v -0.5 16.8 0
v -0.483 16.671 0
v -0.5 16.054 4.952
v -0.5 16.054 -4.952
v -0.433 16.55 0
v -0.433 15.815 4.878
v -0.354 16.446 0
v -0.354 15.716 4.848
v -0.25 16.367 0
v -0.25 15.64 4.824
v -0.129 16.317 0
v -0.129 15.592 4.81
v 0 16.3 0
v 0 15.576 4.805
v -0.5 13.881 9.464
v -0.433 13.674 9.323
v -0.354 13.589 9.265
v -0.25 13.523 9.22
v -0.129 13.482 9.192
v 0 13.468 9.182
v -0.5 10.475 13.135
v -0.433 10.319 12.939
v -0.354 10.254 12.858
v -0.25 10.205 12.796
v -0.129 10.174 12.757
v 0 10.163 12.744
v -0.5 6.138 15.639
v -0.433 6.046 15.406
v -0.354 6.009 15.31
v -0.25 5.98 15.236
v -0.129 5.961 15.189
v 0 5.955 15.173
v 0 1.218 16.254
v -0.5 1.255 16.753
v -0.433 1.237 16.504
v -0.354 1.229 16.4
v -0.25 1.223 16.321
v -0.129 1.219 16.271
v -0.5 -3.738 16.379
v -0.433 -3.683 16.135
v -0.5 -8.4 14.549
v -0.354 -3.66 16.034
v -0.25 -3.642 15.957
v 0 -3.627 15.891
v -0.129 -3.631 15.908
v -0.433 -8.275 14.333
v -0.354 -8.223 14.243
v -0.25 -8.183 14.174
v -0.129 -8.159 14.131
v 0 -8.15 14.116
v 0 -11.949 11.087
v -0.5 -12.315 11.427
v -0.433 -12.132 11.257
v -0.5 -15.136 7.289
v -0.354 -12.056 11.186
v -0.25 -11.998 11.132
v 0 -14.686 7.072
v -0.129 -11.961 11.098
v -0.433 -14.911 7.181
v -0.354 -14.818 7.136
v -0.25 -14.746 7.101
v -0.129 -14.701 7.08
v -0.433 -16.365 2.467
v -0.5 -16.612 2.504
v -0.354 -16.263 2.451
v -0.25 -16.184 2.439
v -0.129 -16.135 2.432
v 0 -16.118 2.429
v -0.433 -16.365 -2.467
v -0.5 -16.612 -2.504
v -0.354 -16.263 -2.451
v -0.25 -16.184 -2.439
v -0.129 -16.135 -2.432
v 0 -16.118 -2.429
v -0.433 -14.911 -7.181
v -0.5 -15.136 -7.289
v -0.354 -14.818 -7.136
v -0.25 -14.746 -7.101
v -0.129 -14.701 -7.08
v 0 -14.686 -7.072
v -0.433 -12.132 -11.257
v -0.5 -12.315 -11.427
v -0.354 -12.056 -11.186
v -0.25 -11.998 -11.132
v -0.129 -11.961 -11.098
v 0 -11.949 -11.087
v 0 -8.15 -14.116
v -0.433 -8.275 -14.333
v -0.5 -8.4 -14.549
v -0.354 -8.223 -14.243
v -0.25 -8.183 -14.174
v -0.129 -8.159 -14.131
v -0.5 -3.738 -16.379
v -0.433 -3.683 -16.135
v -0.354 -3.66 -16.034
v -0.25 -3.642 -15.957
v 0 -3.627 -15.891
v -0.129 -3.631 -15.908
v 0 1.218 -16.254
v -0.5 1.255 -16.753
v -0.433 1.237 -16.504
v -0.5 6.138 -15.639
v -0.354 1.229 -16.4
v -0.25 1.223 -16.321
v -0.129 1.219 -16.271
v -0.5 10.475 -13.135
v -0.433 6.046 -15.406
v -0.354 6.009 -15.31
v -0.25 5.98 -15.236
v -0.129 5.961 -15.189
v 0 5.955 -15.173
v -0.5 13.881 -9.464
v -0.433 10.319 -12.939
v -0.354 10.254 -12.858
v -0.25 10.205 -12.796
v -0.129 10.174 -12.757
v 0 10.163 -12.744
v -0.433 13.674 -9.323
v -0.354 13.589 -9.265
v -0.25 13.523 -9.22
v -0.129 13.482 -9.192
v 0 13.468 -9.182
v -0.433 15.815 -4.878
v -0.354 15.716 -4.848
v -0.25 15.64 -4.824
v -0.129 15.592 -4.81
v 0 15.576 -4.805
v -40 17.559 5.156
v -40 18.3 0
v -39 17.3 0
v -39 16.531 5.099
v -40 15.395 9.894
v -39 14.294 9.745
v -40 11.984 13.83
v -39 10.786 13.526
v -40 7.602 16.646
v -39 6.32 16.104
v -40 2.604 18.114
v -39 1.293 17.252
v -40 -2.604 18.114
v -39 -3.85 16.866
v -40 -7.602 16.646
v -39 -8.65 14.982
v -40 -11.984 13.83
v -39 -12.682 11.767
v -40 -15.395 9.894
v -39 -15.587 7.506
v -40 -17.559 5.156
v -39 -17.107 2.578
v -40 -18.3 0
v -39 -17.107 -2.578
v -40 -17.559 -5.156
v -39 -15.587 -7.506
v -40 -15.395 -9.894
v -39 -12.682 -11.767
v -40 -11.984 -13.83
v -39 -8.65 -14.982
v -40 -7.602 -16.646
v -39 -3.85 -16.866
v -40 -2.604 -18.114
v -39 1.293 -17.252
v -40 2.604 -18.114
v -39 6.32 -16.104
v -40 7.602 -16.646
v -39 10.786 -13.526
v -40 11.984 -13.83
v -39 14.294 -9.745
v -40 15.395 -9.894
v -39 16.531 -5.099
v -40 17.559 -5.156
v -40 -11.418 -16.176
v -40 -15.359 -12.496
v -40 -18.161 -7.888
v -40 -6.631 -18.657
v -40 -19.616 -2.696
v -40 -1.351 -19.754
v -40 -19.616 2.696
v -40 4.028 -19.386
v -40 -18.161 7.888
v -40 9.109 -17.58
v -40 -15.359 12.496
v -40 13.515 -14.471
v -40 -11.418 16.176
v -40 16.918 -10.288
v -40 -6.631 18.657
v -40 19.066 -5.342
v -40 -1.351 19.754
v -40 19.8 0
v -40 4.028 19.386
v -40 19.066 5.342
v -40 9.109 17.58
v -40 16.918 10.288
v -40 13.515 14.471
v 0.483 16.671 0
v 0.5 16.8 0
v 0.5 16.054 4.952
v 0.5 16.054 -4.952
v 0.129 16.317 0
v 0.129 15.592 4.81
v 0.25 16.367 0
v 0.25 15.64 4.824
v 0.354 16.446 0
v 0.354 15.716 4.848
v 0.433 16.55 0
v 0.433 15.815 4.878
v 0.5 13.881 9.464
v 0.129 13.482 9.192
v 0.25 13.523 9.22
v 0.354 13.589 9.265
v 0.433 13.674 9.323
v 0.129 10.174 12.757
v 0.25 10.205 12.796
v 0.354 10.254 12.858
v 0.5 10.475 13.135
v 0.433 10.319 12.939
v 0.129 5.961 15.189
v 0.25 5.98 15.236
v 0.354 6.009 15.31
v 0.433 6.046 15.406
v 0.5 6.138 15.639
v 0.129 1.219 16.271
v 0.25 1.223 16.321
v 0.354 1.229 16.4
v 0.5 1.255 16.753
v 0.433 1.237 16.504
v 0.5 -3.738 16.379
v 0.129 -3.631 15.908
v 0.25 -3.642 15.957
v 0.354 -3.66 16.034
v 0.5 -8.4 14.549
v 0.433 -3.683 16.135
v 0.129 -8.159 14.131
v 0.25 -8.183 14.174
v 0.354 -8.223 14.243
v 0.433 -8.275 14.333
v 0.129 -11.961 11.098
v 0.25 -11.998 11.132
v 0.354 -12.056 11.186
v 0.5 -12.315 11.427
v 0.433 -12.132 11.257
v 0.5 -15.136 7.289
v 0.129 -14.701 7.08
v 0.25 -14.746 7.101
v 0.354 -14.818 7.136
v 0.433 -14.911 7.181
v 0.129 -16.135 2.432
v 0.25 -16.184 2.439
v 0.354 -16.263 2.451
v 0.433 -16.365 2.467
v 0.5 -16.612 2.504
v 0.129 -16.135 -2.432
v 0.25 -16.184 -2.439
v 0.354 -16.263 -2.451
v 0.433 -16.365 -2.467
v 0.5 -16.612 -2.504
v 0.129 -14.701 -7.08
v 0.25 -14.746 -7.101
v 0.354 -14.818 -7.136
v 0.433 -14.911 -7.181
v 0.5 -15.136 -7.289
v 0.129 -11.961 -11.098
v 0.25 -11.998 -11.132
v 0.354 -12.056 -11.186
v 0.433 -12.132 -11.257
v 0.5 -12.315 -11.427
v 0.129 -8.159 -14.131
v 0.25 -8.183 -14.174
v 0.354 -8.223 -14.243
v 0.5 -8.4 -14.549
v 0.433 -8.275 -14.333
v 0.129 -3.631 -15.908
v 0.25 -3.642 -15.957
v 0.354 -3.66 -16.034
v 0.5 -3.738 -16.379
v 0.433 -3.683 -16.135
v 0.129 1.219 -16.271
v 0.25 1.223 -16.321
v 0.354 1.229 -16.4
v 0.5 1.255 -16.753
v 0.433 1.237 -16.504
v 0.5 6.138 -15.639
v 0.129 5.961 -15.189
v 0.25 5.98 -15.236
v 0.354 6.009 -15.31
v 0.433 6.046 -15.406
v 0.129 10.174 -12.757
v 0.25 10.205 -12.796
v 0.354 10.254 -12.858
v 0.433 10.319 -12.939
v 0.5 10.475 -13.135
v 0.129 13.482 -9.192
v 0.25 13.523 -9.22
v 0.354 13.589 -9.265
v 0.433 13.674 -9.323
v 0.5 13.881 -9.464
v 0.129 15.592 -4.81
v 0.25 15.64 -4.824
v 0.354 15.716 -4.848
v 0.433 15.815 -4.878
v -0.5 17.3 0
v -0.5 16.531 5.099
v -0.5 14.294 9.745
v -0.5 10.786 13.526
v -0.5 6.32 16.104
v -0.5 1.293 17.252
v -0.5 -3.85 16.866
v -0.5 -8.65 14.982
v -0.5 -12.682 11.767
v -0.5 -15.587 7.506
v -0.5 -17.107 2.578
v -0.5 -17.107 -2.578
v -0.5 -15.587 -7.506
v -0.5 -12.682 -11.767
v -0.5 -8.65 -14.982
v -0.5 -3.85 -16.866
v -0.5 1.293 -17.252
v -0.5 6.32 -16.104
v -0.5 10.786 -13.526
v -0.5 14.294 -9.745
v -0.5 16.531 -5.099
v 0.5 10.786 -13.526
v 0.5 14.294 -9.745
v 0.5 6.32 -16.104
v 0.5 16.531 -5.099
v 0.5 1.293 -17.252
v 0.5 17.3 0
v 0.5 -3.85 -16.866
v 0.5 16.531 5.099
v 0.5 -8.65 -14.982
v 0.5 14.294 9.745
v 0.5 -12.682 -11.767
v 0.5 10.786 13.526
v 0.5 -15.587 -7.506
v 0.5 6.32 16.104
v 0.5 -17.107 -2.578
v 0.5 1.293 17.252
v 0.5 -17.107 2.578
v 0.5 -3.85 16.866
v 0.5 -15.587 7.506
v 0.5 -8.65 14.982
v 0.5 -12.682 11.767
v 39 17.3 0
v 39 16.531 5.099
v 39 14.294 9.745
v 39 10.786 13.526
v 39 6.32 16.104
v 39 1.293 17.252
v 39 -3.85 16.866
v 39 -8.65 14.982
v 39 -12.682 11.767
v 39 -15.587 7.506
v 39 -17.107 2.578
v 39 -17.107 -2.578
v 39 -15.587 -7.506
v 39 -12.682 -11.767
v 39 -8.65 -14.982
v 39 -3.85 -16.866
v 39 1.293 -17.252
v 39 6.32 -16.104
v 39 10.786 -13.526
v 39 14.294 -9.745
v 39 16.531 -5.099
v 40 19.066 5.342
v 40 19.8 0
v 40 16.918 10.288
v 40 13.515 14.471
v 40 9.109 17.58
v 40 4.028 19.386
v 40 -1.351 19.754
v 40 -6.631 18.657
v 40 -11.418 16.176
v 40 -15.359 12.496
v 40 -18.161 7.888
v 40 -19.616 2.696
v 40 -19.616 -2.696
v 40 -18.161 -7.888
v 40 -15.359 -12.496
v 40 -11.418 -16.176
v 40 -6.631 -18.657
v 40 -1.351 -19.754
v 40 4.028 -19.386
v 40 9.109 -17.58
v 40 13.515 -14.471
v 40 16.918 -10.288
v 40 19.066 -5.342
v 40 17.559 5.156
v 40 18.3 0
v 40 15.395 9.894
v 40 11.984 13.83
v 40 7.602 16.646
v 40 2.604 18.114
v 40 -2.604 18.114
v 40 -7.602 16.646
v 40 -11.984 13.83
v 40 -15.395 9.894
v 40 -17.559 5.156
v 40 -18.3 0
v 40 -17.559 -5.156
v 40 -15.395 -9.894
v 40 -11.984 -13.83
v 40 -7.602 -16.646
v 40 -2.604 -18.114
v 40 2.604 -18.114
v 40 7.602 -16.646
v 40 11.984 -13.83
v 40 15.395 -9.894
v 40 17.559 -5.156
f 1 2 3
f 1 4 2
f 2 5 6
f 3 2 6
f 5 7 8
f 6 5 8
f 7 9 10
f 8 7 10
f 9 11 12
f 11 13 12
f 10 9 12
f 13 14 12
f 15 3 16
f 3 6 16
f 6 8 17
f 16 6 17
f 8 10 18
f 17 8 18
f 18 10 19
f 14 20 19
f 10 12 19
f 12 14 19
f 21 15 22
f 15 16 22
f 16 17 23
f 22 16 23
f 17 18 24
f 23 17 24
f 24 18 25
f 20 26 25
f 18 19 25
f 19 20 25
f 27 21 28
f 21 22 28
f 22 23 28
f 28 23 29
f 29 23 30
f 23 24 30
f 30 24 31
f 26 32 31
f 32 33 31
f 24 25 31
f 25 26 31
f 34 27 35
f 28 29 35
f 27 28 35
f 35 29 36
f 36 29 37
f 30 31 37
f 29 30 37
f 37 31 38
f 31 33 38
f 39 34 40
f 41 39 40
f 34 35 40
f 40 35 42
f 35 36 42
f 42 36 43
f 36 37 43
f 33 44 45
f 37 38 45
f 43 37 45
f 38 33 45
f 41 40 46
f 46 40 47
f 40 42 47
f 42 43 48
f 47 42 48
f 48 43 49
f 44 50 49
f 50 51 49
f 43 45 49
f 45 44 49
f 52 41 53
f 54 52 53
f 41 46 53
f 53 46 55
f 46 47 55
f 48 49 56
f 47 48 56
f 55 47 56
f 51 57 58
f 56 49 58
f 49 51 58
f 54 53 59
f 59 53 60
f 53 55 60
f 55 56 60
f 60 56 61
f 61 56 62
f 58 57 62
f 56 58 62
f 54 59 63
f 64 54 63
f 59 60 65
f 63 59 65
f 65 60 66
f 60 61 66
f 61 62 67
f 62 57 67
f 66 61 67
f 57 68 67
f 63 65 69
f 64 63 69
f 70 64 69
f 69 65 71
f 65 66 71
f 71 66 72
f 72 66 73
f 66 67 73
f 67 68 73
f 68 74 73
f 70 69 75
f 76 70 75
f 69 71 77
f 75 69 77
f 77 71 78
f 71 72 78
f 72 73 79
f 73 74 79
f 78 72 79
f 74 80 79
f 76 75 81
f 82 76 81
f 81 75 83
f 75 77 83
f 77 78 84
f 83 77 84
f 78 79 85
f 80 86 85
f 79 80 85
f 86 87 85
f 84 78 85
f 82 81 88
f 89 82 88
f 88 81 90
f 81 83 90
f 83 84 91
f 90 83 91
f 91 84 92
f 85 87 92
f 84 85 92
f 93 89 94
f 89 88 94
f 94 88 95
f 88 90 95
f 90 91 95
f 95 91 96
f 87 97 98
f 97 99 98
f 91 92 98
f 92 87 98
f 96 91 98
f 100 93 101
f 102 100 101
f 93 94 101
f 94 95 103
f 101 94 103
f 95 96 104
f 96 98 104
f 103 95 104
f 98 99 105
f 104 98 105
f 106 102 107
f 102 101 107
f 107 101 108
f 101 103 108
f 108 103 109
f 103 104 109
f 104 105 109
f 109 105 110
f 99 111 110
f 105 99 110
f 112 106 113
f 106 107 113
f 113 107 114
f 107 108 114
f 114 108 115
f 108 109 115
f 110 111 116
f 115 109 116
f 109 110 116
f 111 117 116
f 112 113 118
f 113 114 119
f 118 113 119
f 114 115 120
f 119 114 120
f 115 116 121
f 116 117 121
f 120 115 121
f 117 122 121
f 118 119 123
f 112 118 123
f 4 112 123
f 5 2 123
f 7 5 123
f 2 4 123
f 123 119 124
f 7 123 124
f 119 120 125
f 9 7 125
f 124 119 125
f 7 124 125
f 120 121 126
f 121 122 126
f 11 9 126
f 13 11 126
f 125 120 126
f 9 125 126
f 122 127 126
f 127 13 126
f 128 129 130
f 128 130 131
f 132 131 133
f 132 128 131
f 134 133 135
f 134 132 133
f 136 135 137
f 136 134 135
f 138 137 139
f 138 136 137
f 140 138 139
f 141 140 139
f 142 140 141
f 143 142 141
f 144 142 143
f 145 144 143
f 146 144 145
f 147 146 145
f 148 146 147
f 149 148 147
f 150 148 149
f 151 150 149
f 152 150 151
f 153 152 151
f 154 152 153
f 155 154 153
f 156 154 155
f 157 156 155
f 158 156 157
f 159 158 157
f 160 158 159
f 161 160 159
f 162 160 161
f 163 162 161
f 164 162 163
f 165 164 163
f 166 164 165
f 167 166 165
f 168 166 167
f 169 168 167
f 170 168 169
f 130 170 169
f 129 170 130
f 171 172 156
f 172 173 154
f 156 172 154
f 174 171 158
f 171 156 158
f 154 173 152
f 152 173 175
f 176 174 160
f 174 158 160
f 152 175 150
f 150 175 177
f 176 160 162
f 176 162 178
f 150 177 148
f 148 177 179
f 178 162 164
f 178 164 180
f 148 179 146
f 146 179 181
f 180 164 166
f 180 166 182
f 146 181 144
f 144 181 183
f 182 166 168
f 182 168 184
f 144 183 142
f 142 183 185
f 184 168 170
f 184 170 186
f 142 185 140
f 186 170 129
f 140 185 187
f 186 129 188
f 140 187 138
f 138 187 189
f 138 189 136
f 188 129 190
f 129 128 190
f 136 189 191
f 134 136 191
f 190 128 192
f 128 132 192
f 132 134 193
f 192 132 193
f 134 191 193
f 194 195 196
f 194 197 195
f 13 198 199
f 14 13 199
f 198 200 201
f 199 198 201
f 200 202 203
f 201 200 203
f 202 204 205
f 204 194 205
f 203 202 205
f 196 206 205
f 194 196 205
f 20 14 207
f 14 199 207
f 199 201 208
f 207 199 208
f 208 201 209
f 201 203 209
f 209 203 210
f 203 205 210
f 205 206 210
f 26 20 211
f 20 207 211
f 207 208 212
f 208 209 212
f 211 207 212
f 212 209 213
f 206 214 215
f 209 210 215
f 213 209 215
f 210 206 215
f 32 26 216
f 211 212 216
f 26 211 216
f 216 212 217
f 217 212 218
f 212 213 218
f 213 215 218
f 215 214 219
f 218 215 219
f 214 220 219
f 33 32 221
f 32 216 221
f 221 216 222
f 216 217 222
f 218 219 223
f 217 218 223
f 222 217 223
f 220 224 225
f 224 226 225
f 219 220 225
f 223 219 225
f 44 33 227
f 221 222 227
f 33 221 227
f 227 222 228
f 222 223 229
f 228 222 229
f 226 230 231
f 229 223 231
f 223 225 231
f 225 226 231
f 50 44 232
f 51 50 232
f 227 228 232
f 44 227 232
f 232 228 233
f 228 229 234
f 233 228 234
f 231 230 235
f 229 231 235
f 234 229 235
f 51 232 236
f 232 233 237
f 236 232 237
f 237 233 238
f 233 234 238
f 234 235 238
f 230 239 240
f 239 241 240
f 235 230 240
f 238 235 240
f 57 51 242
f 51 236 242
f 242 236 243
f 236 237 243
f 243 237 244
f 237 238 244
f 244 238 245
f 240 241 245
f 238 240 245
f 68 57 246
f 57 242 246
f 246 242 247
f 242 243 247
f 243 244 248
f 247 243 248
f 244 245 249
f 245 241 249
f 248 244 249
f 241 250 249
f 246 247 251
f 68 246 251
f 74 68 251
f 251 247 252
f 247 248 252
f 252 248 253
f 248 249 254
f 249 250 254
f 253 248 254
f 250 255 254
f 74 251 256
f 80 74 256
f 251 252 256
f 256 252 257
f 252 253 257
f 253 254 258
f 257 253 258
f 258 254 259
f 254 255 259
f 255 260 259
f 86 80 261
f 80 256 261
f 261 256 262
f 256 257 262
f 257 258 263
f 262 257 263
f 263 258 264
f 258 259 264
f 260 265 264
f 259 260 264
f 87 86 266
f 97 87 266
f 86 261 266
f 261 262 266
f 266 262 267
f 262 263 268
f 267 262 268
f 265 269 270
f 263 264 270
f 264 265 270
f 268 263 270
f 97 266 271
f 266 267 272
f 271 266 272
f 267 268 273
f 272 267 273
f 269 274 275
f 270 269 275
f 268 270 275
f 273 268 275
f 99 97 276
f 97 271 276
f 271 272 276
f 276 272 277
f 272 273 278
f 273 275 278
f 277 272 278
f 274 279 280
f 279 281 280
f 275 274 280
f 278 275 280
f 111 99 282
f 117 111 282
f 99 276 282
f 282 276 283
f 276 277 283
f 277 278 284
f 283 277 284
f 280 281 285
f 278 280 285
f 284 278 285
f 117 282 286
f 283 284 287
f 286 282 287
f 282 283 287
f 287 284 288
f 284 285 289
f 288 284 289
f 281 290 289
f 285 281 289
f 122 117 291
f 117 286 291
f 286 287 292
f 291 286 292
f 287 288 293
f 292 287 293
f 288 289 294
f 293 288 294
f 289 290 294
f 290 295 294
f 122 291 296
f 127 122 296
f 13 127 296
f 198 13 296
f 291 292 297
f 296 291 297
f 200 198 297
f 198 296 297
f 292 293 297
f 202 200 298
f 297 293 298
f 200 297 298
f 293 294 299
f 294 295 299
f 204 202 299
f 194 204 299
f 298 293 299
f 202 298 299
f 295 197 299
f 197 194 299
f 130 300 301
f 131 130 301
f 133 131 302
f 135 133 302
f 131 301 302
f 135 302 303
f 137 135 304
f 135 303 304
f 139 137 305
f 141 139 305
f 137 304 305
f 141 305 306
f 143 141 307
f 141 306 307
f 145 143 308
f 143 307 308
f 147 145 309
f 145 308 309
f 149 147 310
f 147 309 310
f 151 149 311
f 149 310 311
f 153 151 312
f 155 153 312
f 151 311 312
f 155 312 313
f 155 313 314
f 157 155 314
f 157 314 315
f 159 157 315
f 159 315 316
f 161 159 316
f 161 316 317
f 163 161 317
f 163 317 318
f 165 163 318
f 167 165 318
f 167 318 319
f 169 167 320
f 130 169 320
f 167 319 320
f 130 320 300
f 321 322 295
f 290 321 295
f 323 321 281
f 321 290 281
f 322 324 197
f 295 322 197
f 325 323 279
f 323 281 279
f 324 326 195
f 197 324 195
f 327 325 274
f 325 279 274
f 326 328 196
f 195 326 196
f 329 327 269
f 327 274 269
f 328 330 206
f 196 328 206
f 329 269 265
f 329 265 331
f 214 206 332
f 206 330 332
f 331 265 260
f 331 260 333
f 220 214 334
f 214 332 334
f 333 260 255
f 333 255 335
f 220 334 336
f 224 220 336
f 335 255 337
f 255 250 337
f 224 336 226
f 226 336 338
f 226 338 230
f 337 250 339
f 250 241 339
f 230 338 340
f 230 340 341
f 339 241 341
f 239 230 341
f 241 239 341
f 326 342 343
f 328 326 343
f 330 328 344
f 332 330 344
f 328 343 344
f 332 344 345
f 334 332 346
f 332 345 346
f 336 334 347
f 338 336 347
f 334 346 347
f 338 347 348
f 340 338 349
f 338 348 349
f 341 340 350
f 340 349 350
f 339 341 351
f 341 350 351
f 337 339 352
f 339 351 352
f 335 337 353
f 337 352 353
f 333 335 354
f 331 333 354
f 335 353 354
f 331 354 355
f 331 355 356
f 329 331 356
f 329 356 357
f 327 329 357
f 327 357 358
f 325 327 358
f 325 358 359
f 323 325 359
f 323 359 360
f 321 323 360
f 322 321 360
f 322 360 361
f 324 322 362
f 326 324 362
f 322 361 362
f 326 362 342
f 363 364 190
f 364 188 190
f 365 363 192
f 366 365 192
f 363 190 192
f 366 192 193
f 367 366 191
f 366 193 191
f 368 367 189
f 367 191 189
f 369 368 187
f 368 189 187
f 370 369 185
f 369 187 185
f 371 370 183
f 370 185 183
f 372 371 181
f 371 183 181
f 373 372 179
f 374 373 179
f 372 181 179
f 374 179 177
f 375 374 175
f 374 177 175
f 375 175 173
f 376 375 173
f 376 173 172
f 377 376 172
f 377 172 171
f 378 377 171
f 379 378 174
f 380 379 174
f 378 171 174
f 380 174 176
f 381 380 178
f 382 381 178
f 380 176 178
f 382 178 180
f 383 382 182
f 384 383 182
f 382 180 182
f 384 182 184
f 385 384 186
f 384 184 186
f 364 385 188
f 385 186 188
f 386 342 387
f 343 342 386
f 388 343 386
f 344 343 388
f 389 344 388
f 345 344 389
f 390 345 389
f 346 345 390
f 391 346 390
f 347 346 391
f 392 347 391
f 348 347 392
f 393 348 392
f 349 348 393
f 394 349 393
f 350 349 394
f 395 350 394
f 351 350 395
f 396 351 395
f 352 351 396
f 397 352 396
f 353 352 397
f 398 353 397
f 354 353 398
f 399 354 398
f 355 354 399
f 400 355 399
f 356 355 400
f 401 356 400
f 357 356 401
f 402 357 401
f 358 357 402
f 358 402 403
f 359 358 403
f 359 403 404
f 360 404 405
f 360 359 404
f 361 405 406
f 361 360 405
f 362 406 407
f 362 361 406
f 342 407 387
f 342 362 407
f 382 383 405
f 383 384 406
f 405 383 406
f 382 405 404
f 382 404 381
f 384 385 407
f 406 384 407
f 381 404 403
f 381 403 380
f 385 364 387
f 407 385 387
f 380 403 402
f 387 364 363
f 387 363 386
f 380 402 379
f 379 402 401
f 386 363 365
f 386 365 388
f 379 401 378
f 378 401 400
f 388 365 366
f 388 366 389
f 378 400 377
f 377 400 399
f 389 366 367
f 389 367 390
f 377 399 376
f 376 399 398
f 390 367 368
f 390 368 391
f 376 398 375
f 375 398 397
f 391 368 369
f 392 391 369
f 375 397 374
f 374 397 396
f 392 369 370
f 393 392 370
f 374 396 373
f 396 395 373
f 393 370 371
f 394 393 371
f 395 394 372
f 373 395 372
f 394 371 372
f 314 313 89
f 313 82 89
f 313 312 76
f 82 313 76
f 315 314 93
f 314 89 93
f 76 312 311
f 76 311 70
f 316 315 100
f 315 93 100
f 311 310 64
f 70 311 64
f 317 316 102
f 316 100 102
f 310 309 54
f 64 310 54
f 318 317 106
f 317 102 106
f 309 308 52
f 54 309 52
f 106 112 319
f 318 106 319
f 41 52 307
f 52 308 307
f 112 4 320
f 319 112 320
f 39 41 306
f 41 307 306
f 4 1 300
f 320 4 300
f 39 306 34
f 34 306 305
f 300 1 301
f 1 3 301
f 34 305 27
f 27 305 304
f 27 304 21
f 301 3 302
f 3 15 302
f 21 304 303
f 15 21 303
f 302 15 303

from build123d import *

# Parameters (mm, degrees)
F2_R    = 0.49999
F3_SIZE = 1


# Not quite as in the source:
# - a fillet or chamfer is up to 0.001 mm smaller than in the source, because OpenCascade refuses the exact size


with BuildPart() as f1:
    # F0 (on Top) → F1 (revolve)
    with BuildSketch(Plane.XY):
        Polygon((0, 19.8), (-40, 19.8), (-40, 17.3), (-0.5, 17.3), (-0.5, 16.3), (0, 16.3), (0.5, 16.3), (0.5, 17.3), (40, 17.3), (40, 19.8), align=None)
    revolve(axis=Axis((0, 0, 0), (1, 0, 0)))

    # F2 (radius 0.5 in the source; OpenCascade refuses exactly that, so slightly less here)
    f2_edges = [f1.edges().sort_by_distance(p)[0] for p in [
        (-0.5, -16.3, 0),
        (0.5, -16.3, 0),
    ]]
    fillet(f2_edges, radius=F2_R)

    # F3
    f3_edges = [f1.edges().sort_by_distance(p)[0] for p in [
        (-40, -17.3, 0),
        (40, -17.3, 0),
    ]]
    chamfer(f3_edges, length=F3_SIZE)


solid = f1.part
